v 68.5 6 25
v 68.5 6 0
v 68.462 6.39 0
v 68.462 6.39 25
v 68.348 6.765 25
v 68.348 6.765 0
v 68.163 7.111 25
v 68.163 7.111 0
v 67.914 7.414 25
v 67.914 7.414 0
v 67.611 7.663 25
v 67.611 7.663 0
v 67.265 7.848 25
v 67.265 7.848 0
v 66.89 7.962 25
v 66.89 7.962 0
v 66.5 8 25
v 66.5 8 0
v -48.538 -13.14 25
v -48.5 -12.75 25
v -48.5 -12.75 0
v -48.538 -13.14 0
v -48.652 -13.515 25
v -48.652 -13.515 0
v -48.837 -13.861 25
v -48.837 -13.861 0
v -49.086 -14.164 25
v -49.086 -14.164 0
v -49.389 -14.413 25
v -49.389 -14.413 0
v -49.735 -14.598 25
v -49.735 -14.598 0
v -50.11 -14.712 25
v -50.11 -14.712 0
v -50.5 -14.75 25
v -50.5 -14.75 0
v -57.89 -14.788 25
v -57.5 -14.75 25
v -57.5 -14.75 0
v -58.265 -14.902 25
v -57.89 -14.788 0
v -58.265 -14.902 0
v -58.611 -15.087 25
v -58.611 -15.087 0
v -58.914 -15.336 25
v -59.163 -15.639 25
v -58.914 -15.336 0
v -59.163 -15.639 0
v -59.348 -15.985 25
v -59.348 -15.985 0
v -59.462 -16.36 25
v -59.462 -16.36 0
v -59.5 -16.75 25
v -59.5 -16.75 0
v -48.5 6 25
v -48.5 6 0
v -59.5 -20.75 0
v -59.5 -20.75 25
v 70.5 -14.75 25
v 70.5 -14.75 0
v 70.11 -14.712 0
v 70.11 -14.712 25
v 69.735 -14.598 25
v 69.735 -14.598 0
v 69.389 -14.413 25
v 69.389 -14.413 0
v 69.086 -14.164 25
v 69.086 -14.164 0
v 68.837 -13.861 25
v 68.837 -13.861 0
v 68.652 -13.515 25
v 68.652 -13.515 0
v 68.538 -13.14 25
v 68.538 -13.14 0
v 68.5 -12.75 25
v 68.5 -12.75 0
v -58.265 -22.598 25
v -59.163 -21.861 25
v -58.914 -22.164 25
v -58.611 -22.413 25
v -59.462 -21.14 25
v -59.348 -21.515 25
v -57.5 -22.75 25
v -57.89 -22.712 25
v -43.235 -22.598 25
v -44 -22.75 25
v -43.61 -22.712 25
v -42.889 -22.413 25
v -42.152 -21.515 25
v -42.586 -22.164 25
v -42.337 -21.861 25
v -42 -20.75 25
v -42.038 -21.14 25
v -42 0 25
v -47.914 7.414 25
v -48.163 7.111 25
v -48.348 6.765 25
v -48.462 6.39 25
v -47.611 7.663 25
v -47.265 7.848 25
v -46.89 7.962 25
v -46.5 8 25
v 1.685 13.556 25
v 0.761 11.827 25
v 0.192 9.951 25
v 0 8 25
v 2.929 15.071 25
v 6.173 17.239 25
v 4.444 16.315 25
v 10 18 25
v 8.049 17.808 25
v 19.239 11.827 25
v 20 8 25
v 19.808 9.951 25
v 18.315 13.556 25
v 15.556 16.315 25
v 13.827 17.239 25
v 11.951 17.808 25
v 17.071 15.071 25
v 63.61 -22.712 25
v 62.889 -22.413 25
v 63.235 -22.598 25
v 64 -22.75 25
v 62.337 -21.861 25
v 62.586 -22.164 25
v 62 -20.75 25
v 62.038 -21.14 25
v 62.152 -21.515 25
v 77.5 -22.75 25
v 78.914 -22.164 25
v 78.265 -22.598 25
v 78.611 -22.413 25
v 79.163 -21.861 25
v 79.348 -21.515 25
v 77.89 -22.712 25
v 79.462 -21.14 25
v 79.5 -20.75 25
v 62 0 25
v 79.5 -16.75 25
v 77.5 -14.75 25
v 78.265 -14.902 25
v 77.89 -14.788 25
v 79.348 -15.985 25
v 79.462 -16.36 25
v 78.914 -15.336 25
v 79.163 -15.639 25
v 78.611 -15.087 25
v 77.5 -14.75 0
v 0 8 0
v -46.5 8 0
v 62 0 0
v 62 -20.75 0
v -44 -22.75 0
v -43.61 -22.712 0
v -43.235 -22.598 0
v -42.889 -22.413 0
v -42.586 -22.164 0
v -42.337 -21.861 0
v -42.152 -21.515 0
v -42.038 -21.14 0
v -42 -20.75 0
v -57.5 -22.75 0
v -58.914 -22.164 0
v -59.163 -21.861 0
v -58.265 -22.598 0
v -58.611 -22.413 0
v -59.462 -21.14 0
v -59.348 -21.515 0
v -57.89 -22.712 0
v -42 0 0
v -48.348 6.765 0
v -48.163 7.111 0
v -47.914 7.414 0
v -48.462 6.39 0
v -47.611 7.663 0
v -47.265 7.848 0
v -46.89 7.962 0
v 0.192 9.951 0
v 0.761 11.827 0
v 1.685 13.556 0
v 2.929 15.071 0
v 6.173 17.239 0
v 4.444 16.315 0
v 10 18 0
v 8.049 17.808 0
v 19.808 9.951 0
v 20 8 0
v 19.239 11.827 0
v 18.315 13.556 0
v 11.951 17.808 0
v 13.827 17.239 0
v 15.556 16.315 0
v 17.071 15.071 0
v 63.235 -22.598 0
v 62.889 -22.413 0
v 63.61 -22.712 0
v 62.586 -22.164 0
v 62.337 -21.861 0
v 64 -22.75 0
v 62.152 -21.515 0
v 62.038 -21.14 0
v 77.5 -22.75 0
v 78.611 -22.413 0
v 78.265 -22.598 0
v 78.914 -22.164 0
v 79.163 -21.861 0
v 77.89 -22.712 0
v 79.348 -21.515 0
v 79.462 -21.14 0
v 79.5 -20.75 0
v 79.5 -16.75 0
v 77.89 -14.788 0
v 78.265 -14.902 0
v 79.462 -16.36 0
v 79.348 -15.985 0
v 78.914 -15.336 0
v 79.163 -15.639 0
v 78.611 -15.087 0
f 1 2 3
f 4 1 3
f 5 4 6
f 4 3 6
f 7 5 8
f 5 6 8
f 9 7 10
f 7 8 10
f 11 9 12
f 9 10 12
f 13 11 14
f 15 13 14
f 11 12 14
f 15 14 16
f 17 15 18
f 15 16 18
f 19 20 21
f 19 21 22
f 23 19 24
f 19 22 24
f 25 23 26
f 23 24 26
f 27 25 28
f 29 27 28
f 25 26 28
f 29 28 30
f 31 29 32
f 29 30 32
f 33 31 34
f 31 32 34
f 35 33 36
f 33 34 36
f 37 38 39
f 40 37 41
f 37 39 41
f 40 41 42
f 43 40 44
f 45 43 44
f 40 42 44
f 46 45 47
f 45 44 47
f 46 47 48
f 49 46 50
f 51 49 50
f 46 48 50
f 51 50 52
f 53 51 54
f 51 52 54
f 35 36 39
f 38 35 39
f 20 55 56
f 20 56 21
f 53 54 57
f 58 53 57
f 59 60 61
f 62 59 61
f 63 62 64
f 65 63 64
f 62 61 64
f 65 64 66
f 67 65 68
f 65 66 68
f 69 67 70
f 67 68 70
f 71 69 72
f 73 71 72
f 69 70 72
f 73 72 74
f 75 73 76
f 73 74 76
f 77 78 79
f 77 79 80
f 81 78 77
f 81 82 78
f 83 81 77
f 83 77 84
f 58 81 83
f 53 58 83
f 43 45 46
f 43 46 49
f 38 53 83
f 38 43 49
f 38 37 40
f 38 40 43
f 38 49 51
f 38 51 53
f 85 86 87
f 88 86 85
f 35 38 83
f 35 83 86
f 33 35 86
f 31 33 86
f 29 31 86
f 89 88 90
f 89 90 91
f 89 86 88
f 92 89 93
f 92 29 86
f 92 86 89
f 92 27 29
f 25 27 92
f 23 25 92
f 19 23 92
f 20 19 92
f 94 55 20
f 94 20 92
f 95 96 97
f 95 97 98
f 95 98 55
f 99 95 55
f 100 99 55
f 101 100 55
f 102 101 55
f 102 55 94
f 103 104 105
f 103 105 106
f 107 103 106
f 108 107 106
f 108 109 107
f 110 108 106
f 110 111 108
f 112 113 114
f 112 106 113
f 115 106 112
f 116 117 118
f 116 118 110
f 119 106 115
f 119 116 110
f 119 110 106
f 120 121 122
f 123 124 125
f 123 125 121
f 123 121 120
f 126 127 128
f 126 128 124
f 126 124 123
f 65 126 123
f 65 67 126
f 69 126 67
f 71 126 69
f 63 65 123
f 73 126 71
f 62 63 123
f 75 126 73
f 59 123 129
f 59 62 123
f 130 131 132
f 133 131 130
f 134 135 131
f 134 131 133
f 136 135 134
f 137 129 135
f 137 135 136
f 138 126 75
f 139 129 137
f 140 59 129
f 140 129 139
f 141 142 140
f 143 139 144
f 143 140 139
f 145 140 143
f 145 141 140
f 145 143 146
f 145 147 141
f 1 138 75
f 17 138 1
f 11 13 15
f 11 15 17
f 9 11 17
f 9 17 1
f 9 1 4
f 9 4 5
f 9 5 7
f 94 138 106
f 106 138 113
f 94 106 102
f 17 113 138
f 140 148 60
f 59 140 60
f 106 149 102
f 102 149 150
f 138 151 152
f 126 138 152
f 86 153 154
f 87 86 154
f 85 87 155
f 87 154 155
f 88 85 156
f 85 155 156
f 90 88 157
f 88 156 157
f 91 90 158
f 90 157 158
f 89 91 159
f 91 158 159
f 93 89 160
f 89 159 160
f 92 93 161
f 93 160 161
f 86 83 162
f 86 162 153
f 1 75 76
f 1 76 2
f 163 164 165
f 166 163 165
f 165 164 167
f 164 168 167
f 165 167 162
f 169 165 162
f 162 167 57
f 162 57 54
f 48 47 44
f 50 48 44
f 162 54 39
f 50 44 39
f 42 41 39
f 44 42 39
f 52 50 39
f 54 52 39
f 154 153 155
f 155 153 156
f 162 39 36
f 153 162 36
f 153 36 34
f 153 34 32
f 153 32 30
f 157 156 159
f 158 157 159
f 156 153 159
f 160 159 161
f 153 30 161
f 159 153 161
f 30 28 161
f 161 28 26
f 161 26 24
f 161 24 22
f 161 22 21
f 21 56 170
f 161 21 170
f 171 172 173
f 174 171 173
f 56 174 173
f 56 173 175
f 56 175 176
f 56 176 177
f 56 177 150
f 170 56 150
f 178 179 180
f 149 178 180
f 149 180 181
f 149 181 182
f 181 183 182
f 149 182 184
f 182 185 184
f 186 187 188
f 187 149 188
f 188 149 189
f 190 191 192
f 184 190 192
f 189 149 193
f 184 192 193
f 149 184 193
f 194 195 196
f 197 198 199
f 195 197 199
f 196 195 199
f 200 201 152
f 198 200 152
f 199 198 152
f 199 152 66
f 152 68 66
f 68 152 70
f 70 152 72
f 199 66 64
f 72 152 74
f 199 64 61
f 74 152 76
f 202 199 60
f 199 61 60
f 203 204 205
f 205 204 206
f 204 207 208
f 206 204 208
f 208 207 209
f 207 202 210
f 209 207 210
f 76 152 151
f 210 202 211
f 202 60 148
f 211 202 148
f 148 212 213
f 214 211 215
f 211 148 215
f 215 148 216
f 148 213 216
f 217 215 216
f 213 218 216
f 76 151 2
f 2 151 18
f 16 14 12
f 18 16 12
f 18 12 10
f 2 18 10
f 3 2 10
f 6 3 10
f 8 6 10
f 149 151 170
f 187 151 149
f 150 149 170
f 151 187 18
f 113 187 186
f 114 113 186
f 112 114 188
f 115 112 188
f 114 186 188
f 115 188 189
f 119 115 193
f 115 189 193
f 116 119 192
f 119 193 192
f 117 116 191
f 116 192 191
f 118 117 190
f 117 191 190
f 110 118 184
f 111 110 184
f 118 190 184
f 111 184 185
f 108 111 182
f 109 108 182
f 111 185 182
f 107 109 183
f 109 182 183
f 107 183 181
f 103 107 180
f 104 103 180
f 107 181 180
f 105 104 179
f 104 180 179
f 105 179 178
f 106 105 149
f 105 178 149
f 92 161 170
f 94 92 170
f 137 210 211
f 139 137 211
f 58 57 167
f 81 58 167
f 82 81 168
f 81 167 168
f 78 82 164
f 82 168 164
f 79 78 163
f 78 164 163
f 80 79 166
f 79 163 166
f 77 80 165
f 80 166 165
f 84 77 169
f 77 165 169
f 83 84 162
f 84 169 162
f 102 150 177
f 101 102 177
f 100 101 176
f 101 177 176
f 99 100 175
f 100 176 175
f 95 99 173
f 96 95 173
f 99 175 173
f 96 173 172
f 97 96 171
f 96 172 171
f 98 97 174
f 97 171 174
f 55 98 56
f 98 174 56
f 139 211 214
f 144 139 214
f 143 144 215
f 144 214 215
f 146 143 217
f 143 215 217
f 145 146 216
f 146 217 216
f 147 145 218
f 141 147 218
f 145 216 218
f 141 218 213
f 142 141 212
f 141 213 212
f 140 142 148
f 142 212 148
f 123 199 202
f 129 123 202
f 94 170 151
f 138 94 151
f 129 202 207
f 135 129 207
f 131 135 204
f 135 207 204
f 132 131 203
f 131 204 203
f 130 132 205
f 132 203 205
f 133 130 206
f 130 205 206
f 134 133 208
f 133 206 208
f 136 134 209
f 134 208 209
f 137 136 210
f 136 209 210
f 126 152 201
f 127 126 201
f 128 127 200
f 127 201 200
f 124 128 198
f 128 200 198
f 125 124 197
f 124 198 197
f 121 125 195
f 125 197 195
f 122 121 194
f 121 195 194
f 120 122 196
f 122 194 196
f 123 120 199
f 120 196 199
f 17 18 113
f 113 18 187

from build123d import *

# Parameters (mm, degrees)
F1_DEPTH = 25


with BuildPart() as f1:
    # F0 (on Top) → F1 (new body)
    with BuildSketch(Plane.XY):
        with BuildLine():
            Line((-42, 0), (0, 0))
            Line((0, 0), (10, 0))
            Line((10, 0), (20, 0))
            Line((20, 0), (62, 0))
            Line((62, 0), (62, -20.750001))
            ThreePointArc((62, -20.750001), (62.585786, -22.164214), (64, -22.750001))
            Line((64, -22.750001), (77.499998, -22.750001))
            ThreePointArc((77.499998, -22.750001), (78.914212, -22.164214), (79.499998, -20.750001))
            Line((79.499998, -20.750001), (79.499998, -16.750001))
            ThreePointArc((79.499998, -16.750001), (78.914212, -15.335787), (77.499998, -14.750001))
            Line((77.499998, -14.750001), (70.499998, -14.750001))
            ThreePointArc((70.499998, -14.750001), (69.085785, -14.164214), (68.499998, -12.750001))
            Line((68.499998, -12.750001), (68.499998, 6))
            ThreePointArc((68.499998, 6), (67.914212, 7.414214), (66.499998, 8))
            Line((66.499998, 8), (20, 8))
            Line((20, 8), (0, 8))
            Line((0, 8), (-46.499998, 8))
            ThreePointArc((-46.499998, 8), (-47.914212, 7.414214), (-48.499998, 6))
            Line((-48.499998, 6), (-48.499998, -12.750001))
            ThreePointArc((-48.499998, -12.750001), (-49.085785, -14.164214), (-50.499998, -14.750001))
            Line((-50.499998, -14.750001), (-57.499998, -14.750001))
            ThreePointArc((-57.499998, -14.750001), (-58.914212, -15.335787), (-59.499998, -16.750001))
            Line((-59.499998, -16.750001), (-59.499998, -20.750001))
            ThreePointArc((-59.499998, -20.750001), (-58.914212, -22.164214), (-57.499998, -22.750001))
            Line((-57.499998, -22.750001), (-44, -22.750001))
            ThreePointArc((-44, -22.750001), (-42.585786, -22.164214), (-42, -20.750001))
            Line((-42, -20.750001), (-42, 0))
        make_face()
        with BuildLine():
            ThreePointArc((20, 8), (10, 18), (0, 8))
            Line((0, 8), (20, 8))
        make_face()
    extrude(amount=F1_DEPTH)


solid = f1.part
